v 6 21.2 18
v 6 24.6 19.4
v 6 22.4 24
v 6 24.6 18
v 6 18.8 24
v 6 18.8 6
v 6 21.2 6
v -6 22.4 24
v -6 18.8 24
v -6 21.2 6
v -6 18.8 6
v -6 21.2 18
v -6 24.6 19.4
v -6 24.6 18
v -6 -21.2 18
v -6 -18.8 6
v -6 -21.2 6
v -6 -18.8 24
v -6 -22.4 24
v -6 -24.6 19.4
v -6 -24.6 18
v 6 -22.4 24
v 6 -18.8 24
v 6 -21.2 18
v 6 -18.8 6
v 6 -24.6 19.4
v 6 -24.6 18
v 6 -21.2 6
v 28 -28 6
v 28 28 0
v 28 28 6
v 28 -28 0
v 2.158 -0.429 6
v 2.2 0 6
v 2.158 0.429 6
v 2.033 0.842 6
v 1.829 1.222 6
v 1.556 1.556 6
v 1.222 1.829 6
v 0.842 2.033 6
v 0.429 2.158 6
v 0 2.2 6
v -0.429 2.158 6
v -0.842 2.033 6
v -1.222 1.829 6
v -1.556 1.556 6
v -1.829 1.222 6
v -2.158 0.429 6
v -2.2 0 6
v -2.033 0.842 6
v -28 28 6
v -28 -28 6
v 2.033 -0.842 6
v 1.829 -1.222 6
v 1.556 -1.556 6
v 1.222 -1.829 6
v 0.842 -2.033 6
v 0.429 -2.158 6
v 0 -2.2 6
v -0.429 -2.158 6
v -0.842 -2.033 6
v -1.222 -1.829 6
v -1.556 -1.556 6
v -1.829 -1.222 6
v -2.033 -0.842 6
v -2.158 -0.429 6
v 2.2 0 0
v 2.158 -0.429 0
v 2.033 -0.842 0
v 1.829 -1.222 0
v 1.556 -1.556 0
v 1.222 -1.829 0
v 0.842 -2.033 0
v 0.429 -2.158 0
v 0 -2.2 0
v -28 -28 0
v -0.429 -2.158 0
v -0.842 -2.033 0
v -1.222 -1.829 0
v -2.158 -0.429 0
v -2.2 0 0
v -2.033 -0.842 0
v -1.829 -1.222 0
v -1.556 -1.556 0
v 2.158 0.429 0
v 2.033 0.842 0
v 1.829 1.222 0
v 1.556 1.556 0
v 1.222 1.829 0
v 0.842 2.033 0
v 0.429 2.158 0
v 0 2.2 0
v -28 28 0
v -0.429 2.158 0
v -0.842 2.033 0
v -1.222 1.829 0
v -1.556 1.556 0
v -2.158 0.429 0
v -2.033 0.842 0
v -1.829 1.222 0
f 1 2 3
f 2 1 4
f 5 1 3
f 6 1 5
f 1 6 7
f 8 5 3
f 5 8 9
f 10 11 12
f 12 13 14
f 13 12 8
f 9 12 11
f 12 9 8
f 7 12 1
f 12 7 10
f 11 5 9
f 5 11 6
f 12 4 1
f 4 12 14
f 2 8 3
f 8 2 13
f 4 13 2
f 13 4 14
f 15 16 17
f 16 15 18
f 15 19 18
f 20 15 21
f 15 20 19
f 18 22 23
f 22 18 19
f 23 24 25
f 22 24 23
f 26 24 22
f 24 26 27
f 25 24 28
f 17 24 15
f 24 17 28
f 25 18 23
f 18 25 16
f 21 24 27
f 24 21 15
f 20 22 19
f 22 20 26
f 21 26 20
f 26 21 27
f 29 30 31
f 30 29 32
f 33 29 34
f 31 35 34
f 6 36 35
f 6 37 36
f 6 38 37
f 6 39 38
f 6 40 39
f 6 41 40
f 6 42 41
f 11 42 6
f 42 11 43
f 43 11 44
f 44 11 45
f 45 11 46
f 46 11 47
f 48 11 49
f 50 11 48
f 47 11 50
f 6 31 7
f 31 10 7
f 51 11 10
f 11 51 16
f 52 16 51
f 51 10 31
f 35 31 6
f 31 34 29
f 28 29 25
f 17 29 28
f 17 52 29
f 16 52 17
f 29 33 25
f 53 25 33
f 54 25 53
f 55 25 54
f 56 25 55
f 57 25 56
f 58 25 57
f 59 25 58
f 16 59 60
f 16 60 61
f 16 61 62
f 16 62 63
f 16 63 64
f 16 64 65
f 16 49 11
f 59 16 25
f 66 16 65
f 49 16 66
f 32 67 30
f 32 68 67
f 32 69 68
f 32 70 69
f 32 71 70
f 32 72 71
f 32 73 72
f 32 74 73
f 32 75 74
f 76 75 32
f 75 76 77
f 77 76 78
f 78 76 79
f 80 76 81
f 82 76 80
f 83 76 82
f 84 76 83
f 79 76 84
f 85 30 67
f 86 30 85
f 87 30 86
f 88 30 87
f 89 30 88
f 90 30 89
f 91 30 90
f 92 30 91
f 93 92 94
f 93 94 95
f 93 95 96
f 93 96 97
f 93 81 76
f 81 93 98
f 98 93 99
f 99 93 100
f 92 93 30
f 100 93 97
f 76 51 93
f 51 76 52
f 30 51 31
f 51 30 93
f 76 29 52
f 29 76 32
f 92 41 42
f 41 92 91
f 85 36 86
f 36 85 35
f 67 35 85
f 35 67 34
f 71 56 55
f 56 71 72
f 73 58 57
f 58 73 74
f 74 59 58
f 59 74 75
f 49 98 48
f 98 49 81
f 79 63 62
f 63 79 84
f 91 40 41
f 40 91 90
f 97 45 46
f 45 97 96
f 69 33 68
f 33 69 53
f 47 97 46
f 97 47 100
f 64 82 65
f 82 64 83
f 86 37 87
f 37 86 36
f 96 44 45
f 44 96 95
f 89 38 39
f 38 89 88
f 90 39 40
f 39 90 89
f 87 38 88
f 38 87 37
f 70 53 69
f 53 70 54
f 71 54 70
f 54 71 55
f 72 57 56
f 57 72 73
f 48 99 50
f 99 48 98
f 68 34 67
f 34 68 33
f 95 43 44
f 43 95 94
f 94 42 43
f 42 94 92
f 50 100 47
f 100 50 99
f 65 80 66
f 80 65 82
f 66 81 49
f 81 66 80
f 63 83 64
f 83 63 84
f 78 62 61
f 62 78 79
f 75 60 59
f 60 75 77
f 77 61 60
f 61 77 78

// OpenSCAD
$fn = 32;

// ----------------------------------------------------------------------
// Snap-fit latch: 2 arms, 18 mm tall, 3.6 mm undercut hooks
// ----------------------------------------------------------------------

// --- parameters (mm) ---
base_d = 56;              // base plate depth
base_h = 6;               // base plate thickness
span = 40;                // distance between opposite arms
arm_t = 2.4;              // arm thickness
arm_d = 12;               // arm width
height = 18;              // free arm length
head_len = 3.6;           // hook reach
head_h = 6;               // hook height
lead = 1.4;               // lead-in ramp thickness
bore_d = 4.4;             // base fixing bore
top_z = 24;               // height of the arm tips above the base

arms = 2;

difference() {
  union() {
    /* base plate, centred on the arm ring */
    translate([-28, -28, 0]) cube([base_d, base_d, base_h]);
    for (a = [0 : 360 / arms : 359]) rotate([0, 0, a]) {
    /* arm, sunk 0.5 mm into the base */
    translate([-arm_d / 2, span / 2 - arm_t / 2, base_h - 0.5]) cube([arm_d, arm_t, height + 0.5]);
    /* hook: a convex hull of a tall inner block and a thin outer lip
       gives a flat undercut below and a lead-in ramp on top */
    hull() {
      translate([-arm_d / 2, span / 2 + arm_t / 2 - 0.6, top_z - head_h]) cube([arm_d, lead + 0.4, head_h]);
      translate([-arm_d / 2, span / 2 + arm_t / 2 - 0.2, top_z - head_h]) cube([arm_d, head_len, lead]);
    }
    }
  }
  translate([0, 0, -2.5]) cylinder(h = base_h + 5, d = bore_d);
}
